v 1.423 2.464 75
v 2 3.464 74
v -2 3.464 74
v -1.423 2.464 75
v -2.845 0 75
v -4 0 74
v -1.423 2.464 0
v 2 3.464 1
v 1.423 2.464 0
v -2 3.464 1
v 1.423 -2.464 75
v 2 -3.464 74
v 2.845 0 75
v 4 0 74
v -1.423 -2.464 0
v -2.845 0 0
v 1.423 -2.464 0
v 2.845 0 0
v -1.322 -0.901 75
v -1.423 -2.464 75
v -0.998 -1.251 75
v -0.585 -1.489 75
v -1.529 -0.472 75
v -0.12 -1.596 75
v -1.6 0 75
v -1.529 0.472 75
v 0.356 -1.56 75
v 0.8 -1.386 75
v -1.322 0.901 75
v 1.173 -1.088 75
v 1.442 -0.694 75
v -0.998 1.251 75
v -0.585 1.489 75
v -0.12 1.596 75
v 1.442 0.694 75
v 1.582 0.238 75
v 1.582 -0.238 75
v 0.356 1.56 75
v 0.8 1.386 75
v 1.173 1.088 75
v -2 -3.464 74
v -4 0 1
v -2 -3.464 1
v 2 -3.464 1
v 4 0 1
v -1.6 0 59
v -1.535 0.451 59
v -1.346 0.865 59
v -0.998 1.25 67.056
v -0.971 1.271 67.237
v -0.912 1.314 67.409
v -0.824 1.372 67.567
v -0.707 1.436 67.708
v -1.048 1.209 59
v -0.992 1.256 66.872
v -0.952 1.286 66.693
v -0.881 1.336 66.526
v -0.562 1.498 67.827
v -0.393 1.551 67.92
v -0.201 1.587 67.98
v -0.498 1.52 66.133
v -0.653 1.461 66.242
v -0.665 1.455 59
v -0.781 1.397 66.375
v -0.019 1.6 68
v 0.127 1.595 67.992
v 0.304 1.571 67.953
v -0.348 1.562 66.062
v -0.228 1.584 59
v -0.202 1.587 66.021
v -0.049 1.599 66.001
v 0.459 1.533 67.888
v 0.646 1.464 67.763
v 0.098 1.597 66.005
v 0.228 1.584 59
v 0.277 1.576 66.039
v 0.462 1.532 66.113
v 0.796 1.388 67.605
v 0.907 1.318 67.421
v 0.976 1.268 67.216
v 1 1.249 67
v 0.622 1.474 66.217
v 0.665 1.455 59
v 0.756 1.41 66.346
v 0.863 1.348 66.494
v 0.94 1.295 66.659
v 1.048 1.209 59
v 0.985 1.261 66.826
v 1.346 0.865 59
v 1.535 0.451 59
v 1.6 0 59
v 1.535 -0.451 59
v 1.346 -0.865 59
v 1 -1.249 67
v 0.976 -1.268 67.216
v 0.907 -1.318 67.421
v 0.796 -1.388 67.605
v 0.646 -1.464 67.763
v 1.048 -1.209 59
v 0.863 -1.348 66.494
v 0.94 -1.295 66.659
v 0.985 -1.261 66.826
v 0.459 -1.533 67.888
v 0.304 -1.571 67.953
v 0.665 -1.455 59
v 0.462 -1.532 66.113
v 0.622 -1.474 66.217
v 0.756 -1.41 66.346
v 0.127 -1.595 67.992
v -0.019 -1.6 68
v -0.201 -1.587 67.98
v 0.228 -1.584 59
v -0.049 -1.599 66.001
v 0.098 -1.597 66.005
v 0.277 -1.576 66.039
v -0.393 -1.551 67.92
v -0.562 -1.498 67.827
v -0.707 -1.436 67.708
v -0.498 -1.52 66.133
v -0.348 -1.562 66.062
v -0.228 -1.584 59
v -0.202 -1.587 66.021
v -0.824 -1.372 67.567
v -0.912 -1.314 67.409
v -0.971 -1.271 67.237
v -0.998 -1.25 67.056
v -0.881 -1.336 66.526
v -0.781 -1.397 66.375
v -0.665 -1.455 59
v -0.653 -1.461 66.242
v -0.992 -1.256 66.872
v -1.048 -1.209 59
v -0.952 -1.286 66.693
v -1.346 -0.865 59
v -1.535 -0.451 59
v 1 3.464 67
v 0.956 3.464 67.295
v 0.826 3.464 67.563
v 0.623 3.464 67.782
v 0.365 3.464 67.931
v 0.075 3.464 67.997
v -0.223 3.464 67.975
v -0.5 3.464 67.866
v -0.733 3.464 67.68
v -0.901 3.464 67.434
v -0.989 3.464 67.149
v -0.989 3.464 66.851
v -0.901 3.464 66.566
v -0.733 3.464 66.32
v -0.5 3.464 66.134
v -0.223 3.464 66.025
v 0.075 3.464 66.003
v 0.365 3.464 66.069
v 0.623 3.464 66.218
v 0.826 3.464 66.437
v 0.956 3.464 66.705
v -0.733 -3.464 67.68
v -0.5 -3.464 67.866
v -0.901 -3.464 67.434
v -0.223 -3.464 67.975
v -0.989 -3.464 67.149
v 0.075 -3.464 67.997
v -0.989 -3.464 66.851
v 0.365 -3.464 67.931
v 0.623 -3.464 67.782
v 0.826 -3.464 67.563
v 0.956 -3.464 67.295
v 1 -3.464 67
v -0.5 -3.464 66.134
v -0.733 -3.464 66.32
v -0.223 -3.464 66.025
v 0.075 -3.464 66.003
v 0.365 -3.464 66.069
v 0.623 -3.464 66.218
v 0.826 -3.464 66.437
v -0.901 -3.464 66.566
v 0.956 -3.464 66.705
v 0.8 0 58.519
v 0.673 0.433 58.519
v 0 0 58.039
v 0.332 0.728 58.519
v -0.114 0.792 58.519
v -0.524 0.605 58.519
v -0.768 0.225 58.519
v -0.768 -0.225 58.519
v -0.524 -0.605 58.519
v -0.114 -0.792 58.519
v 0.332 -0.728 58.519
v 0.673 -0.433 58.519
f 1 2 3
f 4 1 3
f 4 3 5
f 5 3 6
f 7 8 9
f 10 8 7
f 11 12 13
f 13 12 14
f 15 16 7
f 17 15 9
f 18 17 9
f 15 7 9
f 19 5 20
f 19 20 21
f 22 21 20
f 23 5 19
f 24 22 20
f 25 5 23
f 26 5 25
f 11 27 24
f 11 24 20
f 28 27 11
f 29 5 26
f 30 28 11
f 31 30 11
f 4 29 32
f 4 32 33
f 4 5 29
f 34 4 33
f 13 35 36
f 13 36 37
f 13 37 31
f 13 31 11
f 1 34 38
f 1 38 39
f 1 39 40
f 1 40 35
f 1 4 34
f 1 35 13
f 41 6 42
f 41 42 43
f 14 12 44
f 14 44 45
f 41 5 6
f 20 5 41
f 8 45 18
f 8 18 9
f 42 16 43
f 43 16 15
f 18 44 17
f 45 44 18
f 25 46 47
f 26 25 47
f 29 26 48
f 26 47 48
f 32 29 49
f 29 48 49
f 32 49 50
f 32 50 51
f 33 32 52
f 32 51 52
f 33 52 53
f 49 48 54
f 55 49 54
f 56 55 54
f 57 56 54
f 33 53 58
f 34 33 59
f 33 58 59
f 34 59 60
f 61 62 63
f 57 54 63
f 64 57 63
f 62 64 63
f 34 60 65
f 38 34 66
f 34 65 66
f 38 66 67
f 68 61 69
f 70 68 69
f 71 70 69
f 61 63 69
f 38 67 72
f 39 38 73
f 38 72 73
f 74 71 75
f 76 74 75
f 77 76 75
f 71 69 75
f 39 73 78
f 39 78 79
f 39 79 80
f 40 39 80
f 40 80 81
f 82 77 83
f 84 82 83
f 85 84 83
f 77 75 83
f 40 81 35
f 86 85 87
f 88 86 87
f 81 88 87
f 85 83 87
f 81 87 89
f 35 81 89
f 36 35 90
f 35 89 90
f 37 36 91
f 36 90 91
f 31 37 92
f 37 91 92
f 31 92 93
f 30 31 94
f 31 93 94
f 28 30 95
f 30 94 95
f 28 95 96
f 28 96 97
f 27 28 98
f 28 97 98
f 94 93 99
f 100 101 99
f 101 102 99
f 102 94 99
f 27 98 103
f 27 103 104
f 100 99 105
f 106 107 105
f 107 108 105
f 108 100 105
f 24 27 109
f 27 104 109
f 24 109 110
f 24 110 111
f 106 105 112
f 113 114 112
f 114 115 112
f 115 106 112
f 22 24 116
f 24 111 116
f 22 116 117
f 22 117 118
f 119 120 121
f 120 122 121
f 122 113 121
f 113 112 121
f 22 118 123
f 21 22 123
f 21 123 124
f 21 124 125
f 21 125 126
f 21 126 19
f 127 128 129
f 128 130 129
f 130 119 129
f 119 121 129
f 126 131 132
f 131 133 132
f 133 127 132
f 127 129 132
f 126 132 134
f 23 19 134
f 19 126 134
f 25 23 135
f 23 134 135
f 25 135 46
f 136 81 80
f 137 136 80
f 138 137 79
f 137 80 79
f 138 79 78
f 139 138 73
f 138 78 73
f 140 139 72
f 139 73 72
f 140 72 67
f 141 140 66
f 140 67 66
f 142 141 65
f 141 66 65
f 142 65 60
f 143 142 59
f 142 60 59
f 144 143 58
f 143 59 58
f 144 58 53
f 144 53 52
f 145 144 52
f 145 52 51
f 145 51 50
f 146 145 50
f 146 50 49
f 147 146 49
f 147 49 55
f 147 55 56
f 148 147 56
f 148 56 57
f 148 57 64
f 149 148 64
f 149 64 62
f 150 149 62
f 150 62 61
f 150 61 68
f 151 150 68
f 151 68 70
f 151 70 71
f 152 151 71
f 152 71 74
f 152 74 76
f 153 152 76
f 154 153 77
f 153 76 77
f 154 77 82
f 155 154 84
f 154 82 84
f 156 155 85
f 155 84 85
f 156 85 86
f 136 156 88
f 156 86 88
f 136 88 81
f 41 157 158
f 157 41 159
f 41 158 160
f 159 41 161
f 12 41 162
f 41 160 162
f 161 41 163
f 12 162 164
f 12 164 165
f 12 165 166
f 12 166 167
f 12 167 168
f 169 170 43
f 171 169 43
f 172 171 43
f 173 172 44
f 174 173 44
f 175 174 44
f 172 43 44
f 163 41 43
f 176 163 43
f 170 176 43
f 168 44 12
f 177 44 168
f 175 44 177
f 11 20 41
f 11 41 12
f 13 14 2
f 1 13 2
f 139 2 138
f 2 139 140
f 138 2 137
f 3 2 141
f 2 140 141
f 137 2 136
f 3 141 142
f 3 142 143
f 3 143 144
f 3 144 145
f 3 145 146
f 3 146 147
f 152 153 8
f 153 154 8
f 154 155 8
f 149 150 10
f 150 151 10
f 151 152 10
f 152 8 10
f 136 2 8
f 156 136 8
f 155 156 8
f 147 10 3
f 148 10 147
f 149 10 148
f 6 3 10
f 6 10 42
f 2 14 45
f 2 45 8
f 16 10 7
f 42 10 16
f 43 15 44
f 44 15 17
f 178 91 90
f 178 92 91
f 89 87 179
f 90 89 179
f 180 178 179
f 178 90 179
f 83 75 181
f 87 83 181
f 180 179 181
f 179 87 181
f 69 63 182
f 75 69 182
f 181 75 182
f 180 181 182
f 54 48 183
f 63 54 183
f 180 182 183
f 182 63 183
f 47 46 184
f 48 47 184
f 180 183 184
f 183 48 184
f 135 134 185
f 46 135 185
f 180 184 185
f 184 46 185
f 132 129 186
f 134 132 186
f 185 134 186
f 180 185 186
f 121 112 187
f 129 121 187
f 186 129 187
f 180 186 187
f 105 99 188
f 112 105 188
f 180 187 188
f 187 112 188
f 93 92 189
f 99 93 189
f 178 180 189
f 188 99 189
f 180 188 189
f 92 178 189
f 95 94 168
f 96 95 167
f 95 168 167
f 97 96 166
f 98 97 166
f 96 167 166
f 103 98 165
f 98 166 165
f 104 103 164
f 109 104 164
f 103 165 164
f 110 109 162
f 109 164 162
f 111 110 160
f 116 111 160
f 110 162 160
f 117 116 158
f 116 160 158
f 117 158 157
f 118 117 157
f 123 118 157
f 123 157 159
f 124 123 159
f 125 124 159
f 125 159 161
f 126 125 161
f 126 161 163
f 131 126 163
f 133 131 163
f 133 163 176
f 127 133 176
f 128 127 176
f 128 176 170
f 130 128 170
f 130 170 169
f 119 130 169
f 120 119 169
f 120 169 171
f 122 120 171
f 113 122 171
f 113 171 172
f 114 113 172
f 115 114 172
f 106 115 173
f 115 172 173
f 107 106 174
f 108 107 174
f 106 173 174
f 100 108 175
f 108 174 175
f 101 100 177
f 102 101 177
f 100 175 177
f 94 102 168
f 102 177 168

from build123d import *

# Parameters (mm, degrees)
F1_DEPTH = 75
F3_D     = 3.2
F3_DEPTH = 16
F3_TIP   = 0.9613769904
F5_D     = 2
F5_DEPTH = 20
F5_TIP   = 0.600860619
F6_SIZE  = 1


with BuildPart() as f1:
    # F0 (on Top) → F1 (new body)
    with BuildSketch(Plane.XY):
        Polygon((-2, -3.4641016151), (2, -3.4641016151), (4, 0), (2, 3.4641016151), (-2, 3.4641016151), (-4, 0), align=None)
    extrude(amount=F1_DEPTH)

    # F3
    with Locations(Plane.XY.offset(75)):
        with Locations((0, 0)):
            Hole(F3_D / 2, depth=F3_DEPTH)
            with Locations((0, 0, -(F3_DEPTH + F3_TIP / 2))):  # 118° drill point
                Cone(0, F3_D / 2, F3_TIP, mode=Mode.SUBTRACT)

    # F5
    with Locations(Plane(origin=(0, 3.4641016151, 0), x_dir=(-1, 0, 0), z_dir=(0, 1, 0))):
        with Locations((0, 67)):
            Hole(F5_D / 2, depth=F5_DEPTH)
            with Locations((0, 0, -(F5_DEPTH + F5_TIP / 2))):  # 118° drill point
                Cone(0, F5_D / 2, F5_TIP, mode=Mode.SUBTRACT)

    # F6
    f6_edges = [f1.edges().sort_by_distance(p)[0] for p in [
        (0, 3.464102, 75),
        (-3, 1.732051, 75),
        (-3, -1.732051, 75),
        (0, -3.464102, 75),
        (3, -1.732051, 75),
        (3, 1.732051, 75),
        (-3, 1.732051, 0),
        (0, 3.464102, 0),
        (-3, -1.732051, 0),
        (0, -3.464102, 0),
        (3, -1.732051, 0),
        (3, 1.732051, 0),
    ]]
    chamfer(f6_edges, length=F6_SIZE)


solid = f1.part
